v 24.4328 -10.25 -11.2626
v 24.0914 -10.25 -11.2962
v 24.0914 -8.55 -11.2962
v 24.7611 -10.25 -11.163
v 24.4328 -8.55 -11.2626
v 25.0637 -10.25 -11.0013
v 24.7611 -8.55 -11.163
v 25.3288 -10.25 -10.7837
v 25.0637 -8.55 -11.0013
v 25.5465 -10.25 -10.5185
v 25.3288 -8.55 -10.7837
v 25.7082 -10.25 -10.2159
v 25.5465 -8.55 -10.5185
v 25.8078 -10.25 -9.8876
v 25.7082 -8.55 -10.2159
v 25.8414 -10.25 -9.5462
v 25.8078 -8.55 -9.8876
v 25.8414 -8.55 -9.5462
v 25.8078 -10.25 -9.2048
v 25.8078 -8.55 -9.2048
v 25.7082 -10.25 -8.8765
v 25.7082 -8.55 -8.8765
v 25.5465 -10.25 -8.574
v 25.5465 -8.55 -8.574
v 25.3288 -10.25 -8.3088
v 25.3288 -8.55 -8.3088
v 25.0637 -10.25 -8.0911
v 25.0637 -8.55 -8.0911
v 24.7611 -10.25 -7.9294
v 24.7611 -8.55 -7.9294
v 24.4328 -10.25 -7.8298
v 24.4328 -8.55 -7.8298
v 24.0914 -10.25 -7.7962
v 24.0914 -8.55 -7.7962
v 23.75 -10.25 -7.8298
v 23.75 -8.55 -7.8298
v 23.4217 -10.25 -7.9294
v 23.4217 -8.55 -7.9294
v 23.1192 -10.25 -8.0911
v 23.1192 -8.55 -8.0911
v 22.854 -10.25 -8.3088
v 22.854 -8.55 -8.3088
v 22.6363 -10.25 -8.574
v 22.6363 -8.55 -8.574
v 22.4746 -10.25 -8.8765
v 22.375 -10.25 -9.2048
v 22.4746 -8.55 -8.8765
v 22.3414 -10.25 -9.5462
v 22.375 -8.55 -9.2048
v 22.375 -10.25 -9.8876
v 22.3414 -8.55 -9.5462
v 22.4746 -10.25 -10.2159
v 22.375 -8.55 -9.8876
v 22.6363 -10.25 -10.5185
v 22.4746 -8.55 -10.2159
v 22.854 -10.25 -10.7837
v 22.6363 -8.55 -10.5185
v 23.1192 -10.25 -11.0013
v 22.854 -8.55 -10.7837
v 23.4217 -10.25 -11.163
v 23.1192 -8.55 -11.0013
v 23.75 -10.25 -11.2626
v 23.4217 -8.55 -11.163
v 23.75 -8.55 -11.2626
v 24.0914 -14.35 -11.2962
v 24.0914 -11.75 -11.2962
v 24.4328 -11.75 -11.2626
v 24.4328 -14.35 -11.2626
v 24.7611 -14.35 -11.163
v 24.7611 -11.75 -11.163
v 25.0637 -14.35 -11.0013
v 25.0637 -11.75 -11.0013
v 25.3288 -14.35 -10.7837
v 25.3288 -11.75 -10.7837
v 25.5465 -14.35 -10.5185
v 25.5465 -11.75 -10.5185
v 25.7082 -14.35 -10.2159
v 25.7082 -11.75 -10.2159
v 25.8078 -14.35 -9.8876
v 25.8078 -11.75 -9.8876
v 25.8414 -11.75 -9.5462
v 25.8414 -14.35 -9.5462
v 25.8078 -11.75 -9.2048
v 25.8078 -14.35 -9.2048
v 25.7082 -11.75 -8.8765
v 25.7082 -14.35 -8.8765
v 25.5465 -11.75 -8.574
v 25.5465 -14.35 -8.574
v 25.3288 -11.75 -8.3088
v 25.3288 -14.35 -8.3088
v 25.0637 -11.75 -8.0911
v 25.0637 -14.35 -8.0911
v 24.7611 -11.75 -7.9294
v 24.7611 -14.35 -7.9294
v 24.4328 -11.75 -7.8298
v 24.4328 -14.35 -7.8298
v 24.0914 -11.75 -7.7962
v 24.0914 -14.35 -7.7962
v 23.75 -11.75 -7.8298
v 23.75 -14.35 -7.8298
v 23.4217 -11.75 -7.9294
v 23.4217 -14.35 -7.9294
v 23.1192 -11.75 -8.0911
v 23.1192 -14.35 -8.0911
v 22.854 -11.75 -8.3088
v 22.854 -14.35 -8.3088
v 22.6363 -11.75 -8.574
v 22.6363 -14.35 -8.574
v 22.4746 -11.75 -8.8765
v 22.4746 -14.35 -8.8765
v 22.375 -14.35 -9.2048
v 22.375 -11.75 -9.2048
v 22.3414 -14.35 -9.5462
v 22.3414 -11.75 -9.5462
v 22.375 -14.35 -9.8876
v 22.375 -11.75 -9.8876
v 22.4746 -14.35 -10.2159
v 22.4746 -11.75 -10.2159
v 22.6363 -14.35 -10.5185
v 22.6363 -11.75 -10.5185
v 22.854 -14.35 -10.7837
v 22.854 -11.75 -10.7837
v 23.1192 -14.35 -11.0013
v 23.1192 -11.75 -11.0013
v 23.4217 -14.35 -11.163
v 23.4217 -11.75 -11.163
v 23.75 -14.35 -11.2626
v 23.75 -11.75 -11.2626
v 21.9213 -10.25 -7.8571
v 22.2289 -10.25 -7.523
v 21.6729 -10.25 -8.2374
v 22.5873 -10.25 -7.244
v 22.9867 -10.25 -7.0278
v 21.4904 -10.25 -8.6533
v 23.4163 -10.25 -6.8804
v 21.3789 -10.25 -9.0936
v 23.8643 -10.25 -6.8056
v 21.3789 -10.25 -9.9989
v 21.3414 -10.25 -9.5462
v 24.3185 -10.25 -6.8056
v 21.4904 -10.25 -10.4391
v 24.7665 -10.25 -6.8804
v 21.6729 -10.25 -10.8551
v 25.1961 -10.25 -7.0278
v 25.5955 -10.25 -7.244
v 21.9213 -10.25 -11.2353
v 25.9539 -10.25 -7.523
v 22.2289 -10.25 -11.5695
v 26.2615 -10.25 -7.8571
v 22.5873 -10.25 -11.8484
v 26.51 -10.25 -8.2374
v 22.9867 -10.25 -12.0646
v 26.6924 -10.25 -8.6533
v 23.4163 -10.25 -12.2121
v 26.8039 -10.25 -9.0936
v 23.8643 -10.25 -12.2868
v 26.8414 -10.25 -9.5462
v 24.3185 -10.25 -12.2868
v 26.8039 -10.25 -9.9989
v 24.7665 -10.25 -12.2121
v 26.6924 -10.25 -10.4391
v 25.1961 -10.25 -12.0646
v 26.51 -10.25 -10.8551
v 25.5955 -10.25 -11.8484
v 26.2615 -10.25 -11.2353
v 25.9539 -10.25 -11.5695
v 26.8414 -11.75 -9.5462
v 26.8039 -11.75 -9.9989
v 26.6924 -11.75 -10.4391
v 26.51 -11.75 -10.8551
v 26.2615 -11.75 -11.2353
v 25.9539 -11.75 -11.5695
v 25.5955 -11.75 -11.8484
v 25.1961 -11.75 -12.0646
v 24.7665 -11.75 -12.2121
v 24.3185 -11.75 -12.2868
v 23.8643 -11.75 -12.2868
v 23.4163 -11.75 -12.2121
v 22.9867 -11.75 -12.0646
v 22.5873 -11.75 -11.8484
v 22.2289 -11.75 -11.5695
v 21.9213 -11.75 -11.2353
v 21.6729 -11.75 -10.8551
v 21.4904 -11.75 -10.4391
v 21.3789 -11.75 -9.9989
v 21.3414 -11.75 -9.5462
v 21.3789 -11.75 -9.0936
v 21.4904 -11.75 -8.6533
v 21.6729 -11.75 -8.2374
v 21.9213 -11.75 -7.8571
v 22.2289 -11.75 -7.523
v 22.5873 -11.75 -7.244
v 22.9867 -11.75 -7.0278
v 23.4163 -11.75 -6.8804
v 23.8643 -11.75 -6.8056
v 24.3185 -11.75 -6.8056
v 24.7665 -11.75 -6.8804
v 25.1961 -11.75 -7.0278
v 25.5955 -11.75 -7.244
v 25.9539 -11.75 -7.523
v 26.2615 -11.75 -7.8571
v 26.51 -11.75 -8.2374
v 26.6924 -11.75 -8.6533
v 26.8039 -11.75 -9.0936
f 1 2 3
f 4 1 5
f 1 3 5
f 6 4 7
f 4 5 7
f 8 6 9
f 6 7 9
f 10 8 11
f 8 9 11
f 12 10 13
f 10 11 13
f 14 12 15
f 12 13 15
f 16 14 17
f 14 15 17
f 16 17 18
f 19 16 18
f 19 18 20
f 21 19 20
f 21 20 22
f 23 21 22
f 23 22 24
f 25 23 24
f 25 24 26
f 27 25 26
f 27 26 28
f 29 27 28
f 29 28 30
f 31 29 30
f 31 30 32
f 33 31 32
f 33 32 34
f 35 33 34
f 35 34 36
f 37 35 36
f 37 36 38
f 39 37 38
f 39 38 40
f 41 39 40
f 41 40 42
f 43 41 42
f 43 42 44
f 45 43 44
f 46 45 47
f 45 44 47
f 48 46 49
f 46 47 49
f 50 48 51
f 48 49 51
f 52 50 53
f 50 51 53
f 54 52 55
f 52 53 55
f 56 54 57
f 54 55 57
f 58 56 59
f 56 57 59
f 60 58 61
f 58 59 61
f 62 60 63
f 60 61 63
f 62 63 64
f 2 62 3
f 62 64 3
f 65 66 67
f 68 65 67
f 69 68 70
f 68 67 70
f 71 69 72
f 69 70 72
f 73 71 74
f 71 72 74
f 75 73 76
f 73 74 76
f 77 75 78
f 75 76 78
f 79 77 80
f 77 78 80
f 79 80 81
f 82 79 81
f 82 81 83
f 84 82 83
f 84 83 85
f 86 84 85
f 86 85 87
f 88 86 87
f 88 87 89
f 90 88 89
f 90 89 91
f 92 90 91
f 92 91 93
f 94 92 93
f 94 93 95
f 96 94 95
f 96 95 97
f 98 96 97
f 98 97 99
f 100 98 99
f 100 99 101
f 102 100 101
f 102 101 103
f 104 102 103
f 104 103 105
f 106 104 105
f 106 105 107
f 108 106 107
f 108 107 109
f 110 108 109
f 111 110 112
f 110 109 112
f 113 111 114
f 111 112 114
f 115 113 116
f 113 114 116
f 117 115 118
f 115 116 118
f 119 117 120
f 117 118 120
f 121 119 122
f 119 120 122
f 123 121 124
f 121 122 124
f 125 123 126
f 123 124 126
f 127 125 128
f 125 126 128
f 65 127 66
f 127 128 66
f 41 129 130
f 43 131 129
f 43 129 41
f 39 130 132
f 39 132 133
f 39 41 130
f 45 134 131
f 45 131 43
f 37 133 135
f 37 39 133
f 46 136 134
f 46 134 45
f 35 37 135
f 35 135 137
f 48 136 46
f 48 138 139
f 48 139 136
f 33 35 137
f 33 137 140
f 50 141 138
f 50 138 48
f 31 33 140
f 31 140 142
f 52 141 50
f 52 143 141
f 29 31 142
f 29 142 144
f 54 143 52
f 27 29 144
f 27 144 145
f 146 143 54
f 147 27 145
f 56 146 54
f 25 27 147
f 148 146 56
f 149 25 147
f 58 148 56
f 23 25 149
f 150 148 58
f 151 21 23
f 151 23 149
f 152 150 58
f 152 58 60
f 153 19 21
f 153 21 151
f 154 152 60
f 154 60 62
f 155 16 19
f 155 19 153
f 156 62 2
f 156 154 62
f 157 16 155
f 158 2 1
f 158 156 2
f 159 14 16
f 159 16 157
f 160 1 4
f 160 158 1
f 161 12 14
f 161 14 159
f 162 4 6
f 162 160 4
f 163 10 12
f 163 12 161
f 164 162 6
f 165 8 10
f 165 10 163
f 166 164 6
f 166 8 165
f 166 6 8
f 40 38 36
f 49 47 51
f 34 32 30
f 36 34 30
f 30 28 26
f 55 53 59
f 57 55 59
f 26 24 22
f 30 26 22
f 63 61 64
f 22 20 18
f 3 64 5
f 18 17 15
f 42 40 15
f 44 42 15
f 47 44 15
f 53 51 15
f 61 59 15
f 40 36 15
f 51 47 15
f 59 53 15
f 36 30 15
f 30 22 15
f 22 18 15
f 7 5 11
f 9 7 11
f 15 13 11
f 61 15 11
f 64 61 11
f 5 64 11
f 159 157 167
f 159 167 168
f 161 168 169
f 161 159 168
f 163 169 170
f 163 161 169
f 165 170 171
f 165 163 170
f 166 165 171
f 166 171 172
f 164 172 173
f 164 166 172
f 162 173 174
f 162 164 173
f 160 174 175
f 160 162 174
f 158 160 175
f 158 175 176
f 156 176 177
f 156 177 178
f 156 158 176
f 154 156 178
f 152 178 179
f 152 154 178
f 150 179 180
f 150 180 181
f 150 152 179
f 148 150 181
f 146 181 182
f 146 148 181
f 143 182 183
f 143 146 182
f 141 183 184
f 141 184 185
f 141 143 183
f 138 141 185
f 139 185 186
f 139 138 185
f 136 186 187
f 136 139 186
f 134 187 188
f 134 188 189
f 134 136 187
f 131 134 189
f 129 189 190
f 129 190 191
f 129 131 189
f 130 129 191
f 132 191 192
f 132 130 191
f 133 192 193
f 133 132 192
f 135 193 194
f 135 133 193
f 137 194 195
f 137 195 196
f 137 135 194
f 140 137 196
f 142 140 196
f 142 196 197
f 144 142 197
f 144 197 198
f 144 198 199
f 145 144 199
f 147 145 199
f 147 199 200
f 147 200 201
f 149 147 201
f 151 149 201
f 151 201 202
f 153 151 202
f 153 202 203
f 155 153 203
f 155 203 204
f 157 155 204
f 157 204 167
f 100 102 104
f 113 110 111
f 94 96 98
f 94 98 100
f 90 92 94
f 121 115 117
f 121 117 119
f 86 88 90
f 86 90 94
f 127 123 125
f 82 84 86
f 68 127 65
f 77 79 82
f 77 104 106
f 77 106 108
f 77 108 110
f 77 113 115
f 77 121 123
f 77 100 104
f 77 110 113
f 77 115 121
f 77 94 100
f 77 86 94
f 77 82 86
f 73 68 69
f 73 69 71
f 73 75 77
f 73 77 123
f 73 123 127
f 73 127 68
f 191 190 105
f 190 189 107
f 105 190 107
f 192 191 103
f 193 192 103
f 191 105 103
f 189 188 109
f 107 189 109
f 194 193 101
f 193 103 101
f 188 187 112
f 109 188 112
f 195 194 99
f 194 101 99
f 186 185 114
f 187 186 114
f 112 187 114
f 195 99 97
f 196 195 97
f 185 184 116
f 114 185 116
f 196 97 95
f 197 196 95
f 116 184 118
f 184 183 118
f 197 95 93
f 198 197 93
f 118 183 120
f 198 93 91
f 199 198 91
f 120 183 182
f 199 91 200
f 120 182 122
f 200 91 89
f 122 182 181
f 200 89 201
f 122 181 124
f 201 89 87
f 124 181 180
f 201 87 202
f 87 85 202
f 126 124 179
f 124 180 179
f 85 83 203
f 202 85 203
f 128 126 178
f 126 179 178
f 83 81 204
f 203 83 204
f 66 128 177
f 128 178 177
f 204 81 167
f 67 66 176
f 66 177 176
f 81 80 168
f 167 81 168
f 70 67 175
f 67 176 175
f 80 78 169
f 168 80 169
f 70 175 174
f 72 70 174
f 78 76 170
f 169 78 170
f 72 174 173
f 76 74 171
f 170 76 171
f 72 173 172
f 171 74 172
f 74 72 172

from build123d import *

# Parameters (mm, degrees)
SKETCH_1_R        = 1.75
EXTRUDE_1_DEPTH   = 5.8
SKETCH_2_R        = 2.75
SKETCH_2_R_2      = 1.75
EXTRUDE_1_2_DEPTH = 1.5


with BuildPart() as part:
    # 草图1 → Extrude 1 (new body)
    with BuildSketch(Plane.XZ.offset(8.55)):
        with Locations(Location((24.091410852, -9.546220913, 0), (0, 0, 270))):
            Circle(SKETCH_1_R)
    extrude(amount=EXTRUDE_1_DEPTH)

    # 草图2 → Extrude 1 2 (add)
    with BuildSketch(Plane(origin=(0, -10.25, 0), x_dir=(1, 0, 0), z_dir=(0, 1, 0))):
        with Locations((24.091410852, 9.546220913)):
            Circle(SKETCH_2_R)
        with Locations((24.091410852, 9.546220913)):
            Circle(SKETCH_2_R_2, mode=Mode.SUBTRACT)
    extrude(amount=-EXTRUDE_1_2_DEPTH)


solid = part.part
